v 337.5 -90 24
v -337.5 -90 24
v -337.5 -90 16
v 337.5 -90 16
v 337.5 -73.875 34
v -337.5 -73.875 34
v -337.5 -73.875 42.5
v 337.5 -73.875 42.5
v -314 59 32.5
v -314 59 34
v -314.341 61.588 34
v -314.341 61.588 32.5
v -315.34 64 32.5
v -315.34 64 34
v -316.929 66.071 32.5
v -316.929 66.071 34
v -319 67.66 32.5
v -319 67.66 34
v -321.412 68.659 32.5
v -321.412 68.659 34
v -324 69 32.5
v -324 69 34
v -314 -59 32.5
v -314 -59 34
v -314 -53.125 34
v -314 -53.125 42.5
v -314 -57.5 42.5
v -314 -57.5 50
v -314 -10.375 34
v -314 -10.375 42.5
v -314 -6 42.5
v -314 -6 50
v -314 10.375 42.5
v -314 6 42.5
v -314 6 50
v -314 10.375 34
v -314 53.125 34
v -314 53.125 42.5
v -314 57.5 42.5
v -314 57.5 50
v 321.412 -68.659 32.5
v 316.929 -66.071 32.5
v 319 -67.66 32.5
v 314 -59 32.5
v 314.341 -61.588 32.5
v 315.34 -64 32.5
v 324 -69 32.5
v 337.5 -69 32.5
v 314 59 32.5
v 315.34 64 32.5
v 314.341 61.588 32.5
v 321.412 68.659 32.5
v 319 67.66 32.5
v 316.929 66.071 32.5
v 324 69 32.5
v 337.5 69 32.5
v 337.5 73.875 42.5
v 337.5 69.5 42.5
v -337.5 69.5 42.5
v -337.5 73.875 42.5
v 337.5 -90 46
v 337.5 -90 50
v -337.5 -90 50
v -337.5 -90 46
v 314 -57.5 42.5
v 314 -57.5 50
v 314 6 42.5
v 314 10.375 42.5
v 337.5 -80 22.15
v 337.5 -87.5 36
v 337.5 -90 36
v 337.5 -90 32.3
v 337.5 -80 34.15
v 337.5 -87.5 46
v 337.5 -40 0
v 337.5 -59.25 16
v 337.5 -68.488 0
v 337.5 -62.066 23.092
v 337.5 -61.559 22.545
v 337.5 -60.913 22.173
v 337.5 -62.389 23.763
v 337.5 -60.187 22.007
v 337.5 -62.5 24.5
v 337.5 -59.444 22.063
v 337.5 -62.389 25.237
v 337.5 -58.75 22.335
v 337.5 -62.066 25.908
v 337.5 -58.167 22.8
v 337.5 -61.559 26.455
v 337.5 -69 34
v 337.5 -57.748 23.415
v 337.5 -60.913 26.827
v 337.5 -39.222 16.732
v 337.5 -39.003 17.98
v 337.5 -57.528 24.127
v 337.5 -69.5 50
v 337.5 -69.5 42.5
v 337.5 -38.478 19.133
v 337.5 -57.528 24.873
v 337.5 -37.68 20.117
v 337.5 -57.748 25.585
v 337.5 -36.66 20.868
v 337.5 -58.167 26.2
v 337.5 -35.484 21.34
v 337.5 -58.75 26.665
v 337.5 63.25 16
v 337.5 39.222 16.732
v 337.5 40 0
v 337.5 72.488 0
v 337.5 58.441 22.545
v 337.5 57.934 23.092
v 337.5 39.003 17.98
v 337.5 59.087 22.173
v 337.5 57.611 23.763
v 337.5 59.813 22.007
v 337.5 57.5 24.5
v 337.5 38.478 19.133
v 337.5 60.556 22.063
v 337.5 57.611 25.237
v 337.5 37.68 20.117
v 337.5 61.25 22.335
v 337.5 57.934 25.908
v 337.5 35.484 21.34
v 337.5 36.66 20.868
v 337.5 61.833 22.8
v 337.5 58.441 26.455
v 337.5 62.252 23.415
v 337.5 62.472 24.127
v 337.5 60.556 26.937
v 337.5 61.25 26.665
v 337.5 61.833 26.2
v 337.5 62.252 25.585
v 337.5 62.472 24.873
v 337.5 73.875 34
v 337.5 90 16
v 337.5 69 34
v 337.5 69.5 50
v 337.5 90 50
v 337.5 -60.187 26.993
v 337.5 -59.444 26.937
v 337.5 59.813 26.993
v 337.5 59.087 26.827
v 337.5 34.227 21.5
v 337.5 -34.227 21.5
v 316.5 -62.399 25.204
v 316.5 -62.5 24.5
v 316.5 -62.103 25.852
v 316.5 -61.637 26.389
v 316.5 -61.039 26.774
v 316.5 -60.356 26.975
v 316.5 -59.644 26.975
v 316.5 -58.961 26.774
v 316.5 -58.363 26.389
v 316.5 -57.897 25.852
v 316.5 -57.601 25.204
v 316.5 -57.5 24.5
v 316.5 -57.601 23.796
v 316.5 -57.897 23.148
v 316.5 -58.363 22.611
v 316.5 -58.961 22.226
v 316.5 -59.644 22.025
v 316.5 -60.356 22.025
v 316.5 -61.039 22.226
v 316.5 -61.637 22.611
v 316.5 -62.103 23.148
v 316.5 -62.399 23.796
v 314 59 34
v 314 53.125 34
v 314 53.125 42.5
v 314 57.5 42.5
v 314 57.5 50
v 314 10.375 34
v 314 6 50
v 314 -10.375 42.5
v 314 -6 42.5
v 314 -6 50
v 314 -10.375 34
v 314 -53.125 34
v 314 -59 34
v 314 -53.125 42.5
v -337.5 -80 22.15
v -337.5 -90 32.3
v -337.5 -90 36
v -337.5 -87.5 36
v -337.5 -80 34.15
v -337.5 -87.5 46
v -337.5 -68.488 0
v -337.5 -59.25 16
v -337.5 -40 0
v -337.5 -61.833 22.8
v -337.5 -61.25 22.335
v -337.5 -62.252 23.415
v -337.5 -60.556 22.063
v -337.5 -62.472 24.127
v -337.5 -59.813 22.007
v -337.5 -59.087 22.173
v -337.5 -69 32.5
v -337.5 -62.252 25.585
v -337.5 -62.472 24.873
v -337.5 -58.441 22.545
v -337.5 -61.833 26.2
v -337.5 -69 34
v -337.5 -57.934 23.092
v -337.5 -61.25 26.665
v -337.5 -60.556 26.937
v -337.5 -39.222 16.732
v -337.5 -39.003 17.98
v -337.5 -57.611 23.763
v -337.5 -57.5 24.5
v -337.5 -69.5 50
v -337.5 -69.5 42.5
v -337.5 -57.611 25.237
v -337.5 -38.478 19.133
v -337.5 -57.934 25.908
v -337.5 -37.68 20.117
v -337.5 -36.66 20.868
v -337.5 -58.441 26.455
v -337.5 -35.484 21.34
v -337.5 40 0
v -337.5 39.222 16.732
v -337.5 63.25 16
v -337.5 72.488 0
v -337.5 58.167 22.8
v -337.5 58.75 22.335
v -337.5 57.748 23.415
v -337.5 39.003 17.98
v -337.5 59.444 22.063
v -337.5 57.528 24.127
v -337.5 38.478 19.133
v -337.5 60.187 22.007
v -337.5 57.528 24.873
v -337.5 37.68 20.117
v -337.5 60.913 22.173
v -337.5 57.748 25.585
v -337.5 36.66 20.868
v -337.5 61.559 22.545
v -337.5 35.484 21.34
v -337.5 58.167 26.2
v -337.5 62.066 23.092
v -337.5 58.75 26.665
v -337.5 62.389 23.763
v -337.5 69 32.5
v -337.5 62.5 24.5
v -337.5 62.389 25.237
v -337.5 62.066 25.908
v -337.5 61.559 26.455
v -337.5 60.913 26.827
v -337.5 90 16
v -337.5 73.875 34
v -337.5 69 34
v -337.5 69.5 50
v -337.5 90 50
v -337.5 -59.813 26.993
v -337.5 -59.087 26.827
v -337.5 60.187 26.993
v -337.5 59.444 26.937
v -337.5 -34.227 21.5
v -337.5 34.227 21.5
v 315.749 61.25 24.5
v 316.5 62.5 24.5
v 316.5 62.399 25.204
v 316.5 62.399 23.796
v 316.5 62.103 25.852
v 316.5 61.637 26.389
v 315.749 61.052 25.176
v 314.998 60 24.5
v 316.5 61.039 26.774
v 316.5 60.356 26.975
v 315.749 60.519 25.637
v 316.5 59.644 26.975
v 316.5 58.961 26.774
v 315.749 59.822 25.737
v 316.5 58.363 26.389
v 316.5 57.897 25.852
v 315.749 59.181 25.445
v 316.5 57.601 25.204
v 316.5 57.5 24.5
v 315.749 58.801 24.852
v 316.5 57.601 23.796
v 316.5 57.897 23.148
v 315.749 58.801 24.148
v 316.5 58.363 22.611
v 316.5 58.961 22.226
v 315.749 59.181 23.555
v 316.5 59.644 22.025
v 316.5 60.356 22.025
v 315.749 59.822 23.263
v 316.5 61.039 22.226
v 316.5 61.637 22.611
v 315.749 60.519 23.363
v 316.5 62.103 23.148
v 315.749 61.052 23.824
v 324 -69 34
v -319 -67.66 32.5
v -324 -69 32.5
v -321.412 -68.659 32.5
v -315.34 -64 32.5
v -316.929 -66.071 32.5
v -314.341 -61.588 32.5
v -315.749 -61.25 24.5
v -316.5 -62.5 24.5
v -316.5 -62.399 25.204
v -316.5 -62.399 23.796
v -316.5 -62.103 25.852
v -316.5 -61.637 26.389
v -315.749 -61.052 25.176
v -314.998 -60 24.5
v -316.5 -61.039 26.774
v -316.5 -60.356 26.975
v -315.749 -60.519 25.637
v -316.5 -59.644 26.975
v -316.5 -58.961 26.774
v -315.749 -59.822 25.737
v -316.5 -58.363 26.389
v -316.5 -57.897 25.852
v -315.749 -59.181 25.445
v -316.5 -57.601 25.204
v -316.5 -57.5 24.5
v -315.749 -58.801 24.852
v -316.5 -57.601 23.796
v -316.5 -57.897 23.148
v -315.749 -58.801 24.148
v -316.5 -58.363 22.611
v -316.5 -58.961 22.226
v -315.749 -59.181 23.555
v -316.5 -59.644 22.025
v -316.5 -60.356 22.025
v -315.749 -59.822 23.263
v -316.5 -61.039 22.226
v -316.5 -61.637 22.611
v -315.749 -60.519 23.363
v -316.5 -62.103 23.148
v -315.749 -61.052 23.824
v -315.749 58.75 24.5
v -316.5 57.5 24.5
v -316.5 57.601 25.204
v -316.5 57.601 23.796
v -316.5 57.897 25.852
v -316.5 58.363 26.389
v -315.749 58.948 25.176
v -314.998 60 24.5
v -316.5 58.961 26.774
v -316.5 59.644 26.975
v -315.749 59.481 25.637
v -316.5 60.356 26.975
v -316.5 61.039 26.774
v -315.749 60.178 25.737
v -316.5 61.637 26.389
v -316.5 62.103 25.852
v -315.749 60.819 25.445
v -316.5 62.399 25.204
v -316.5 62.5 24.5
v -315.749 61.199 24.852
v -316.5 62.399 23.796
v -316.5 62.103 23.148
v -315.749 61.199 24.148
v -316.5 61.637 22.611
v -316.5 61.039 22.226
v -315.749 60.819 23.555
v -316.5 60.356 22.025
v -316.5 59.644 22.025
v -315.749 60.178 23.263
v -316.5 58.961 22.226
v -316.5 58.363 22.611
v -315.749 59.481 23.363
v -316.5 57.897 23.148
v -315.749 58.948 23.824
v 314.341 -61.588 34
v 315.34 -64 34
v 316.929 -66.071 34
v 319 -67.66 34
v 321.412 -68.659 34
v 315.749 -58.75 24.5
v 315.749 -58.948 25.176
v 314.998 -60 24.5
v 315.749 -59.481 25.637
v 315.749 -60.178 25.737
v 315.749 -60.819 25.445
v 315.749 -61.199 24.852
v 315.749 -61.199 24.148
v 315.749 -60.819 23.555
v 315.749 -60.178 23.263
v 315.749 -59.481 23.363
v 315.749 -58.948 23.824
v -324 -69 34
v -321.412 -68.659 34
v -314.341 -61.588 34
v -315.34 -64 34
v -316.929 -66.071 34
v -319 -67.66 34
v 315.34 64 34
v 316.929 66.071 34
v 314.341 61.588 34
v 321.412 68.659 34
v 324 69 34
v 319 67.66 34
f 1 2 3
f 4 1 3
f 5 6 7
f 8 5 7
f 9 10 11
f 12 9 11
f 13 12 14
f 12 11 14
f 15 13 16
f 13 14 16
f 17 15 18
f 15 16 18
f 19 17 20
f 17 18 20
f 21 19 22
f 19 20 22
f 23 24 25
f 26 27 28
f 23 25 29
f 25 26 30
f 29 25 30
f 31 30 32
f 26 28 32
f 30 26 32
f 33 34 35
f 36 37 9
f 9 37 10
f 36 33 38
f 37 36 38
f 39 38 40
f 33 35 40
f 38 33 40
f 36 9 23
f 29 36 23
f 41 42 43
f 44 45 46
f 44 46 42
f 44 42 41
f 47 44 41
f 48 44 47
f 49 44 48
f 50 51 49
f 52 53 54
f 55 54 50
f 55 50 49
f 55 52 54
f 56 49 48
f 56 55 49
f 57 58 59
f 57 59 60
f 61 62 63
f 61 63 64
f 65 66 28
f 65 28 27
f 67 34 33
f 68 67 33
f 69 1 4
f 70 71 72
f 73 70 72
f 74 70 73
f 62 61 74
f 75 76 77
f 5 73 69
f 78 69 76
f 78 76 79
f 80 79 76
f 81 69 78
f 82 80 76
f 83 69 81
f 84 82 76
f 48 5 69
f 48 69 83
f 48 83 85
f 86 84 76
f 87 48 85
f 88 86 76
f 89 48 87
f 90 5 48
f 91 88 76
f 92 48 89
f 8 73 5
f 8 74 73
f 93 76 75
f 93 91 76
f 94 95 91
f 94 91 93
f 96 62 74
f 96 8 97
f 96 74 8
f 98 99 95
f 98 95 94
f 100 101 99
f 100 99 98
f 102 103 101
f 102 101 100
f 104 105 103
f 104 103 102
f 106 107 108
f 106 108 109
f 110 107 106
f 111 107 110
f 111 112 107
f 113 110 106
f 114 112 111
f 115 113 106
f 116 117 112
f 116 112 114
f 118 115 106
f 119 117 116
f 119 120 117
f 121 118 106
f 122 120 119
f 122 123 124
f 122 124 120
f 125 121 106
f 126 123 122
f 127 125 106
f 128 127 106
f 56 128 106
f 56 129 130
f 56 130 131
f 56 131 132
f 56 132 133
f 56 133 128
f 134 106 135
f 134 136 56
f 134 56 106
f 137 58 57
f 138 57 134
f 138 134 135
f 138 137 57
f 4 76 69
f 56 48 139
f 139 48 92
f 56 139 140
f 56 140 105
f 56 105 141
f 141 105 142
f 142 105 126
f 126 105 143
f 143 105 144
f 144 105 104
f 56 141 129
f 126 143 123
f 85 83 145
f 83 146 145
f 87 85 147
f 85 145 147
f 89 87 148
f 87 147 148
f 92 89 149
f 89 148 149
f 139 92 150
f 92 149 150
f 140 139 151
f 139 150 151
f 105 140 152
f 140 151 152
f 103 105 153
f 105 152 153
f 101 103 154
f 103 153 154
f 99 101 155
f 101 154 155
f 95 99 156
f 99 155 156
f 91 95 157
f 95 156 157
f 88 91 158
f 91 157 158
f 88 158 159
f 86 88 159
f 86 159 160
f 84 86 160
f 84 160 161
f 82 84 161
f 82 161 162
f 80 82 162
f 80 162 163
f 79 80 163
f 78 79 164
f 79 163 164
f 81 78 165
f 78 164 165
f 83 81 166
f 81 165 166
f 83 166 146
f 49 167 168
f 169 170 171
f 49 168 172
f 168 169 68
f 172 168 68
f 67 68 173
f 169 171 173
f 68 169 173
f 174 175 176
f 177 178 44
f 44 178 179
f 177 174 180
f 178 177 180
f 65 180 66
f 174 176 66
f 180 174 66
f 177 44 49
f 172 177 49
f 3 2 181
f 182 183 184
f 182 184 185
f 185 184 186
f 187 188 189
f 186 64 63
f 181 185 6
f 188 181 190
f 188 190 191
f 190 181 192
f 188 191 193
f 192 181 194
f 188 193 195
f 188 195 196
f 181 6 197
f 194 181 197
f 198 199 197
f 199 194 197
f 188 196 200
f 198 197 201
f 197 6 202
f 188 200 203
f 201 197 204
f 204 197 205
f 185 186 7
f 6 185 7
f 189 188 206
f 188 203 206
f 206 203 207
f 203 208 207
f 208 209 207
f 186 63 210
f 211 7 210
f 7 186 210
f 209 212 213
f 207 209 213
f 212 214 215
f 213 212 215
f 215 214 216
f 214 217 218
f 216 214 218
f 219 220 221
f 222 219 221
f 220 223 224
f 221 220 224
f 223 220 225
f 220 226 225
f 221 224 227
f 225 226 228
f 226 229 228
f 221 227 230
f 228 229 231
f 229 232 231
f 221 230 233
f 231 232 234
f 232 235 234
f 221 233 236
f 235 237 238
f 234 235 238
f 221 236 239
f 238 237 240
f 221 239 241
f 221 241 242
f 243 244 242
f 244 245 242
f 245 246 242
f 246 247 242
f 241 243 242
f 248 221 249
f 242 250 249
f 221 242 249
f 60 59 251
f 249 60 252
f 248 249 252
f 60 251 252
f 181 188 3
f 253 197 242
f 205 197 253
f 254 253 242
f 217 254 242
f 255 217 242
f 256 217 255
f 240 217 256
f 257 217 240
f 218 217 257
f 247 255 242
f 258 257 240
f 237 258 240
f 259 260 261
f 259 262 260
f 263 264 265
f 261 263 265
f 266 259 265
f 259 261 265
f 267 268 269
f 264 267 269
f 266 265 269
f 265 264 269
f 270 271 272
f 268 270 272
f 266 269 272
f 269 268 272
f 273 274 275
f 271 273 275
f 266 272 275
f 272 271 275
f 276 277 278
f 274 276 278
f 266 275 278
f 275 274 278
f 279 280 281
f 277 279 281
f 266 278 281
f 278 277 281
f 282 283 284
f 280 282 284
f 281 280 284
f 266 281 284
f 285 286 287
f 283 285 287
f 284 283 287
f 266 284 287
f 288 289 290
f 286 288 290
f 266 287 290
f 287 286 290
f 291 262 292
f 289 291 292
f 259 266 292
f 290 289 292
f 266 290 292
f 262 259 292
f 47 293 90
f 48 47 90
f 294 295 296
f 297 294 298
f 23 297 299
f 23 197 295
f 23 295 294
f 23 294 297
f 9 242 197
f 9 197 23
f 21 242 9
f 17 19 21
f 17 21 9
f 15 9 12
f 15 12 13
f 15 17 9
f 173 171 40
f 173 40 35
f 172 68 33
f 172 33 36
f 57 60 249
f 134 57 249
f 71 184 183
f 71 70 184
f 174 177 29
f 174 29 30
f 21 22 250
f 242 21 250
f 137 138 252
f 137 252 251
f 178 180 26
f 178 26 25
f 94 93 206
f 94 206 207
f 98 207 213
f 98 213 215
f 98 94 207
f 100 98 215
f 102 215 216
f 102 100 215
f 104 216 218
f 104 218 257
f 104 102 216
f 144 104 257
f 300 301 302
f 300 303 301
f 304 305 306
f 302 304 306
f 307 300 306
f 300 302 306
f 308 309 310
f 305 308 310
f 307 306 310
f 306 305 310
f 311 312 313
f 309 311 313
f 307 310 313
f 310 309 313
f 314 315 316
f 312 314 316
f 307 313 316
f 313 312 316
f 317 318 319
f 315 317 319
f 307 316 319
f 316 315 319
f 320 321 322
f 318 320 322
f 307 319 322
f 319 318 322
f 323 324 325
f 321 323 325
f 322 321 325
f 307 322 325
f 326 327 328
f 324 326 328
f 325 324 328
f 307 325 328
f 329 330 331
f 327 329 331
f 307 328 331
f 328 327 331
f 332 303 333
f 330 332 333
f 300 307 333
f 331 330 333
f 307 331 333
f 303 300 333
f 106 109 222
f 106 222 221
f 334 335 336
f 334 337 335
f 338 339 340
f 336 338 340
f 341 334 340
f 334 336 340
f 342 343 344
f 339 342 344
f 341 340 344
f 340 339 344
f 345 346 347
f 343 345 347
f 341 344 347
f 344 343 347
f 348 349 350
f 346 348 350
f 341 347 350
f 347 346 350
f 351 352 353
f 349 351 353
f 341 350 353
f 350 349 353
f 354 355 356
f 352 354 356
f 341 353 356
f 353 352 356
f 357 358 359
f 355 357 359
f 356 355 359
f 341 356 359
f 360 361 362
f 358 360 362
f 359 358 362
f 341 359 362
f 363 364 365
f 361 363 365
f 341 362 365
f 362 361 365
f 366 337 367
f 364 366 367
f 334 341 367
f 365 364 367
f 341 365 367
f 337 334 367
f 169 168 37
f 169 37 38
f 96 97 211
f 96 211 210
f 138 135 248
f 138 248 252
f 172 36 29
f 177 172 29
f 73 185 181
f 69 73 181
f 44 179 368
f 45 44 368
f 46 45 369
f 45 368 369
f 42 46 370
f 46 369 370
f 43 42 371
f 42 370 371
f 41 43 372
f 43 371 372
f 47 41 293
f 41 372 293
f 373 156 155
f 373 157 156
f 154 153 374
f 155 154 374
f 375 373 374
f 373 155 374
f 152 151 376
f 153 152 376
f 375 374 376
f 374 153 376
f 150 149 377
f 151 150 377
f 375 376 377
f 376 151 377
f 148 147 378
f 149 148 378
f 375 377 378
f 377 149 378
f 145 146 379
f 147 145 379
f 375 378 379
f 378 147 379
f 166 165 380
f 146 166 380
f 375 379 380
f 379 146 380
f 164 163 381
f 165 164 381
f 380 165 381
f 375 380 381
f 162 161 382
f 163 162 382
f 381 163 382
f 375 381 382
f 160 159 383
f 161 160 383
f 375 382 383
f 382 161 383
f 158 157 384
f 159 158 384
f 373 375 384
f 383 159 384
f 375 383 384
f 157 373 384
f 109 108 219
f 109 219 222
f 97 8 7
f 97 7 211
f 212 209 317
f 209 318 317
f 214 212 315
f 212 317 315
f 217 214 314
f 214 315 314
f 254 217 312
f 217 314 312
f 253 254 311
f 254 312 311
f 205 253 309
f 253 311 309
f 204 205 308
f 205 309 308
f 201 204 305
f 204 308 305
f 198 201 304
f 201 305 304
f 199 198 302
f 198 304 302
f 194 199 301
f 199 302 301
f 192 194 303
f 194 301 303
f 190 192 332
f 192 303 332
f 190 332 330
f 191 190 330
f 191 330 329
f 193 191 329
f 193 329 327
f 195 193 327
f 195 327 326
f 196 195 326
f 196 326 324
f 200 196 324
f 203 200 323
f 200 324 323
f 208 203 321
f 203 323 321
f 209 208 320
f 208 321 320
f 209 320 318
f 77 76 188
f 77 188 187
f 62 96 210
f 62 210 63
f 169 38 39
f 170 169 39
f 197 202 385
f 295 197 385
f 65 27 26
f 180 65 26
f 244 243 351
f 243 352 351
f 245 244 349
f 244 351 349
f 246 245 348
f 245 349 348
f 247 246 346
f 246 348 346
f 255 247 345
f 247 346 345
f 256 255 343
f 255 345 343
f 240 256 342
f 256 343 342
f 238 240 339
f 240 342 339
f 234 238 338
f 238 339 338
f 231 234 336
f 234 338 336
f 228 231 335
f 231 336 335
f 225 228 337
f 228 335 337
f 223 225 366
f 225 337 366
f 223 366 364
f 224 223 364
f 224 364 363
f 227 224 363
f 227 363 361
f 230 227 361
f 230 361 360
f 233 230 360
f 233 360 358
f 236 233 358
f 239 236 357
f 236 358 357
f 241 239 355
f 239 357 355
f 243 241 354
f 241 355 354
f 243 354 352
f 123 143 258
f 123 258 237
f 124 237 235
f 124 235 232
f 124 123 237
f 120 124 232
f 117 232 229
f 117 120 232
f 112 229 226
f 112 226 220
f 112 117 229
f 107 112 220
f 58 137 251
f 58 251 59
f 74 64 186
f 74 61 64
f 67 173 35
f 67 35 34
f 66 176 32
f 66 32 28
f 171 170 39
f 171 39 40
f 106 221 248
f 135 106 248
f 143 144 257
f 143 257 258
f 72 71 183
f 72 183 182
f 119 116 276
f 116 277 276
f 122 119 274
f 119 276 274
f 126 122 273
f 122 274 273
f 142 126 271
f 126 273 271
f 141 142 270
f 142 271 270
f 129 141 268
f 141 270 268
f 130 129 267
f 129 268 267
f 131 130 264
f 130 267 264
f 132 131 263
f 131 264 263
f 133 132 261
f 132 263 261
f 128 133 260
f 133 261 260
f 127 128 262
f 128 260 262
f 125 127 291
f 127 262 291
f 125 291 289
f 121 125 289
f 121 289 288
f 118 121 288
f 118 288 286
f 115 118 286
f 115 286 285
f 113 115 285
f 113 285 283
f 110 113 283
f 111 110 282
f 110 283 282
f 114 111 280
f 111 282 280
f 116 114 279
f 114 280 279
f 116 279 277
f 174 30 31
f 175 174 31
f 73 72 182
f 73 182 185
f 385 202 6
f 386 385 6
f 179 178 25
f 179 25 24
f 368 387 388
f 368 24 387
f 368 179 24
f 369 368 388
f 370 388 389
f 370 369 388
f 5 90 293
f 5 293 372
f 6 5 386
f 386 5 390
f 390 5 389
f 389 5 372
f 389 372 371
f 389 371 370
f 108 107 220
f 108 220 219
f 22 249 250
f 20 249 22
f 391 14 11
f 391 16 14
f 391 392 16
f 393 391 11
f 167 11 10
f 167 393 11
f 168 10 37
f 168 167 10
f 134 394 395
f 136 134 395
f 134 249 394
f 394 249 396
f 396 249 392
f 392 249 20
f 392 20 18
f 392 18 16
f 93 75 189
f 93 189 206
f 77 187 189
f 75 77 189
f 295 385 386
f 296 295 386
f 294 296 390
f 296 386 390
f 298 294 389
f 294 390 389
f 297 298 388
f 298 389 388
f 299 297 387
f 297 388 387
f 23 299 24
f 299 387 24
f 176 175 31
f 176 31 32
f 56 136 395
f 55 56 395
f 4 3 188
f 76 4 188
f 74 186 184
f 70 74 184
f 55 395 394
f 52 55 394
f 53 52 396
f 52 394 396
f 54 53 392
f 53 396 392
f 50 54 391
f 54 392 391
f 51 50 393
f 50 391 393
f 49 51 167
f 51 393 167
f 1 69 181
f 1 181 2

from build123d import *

# Parameters (mm, degrees)
F1_DEPTH      = 337.5
F3_DEPTH      = 1.5
F3_DEPTH_BACK = 16
F5_D          = 5
F5_DEPTH      = 21
F5_TIP        = 1.5021515476
F7_D          = 5
F7_DEPTH      = 21
F7_TIP        = 1.5021515476


with BuildPart() as f1:
    # F0 (on Right) → F1 (new body, symmetric)
    with BuildSketch(Plane.YZ):
        with BuildLine():
            Line((-87.5, 36), (-90, 36))
            Line((-90, 36), (-90, 32.3))
            Line((-90, 32.3), (-80, 34.15))
            Line((-80, 34.15), (-80, 22.15))
            Line((-80, 22.15), (-90, 24))
            Line((-90, 24), (-90, 16))
            Line((-90, 16), (-59.25, 16))
            Line((-59.25, 16), (-68.487604307, 0))
            Line((-68.487604307, 0), (-40, 0))
            Line((-40, 0), (-39.2217531629, 16.7323069968))
            ThreePointArc((-39.2217531629, 16.7323069968), (-37.6795768821, 20.1167343684), (-34.2271527326, 21.5))
            Line((-34.2271527326, 21.5), (34.2271527326, 21.5))
            ThreePointArc((34.2271527326, 21.5), (37.6795768821, 20.1167343684), (39.2217531629, 16.7323069968))
            Line((39.2217531629, 16.7323069968), (40, 0))
            Line((40, 0), (72.487604307, 0))
            Line((72.487604307, 0), (63.25, 16))
            Line((63.25, 16), (90, 16))
            Line((90, 16), (90, 50))
            Line((90, 50), (69.5, 50))
            Line((69.5, 50), (69.5, 42.5))
            Line((69.5, 42.5), (73.875, 42.5))
            Line((73.875, 42.5), (73.875, 34))
            Line((73.875, 34), (53.125, 34))
            Line((53.125, 34), (53.125, 42.5))
            Line((53.125, 42.5), (57.5, 42.5))
            Line((57.5, 42.5), (57.5, 50))
            Line((57.5, 50), (6, 50))
            Line((6, 50), (6, 42.5))
            Line((6, 42.5), (10.375, 42.5))
            Line((10.375, 42.5), (10.375, 34))
            Line((10.375, 34), (-10.375, 34))
            Line((-10.375, 34), (-10.375, 42.5))
            Line((-10.375, 42.5), (-6, 42.5))
            Line((-6, 42.5), (-6, 50))
            Line((-6, 50), (-57.5, 50))
            Line((-57.5, 50), (-57.5, 42.5))
            Line((-57.5, 42.5), (-53.125, 42.5))
            Line((-53.125, 42.5), (-53.125, 34))
            Line((-53.125, 34), (-73.875, 34))
            Line((-73.875, 34), (-73.875, 42.5))
            Line((-73.875, 42.5), (-69.5, 42.5))
            Line((-69.5, 42.5), (-69.5, 50))
            Line((-69.5, 50), (-90, 50))
            Line((-90, 50), (-90, 46))
            Line((-90, 46), (-87.5, 46))
            Line((-87.5, 46), (-87.5, 36))
        make_face()
    extrude(amount=F1_DEPTH, both=True)

    # F2 (on face) → F3 (cut, two sides)
    with BuildSketch(Plane.XY.offset(34)) as f3_sk:
        with BuildLine():
            ThreePointArc((314, -59), (316.9289321881, -66.0710678119), (324, -69))
            Line((324, -69), (337.5, -69))
            Line((337.5, -69), (337.5, 69))
            Line((337.5, 69), (324, 69))
            ThreePointArc((324, 69), (316.9289321881, 66.0710678119), (314, 59))
            Line((314, 59), (314, -59))
        make_face()
        with BuildLine():
            ThreePointArc((-324, -69), (-316.9289321881, -66.0710678119), (-314, -59))
            Line((-314, -59), (-314, 59))
            ThreePointArc((-314, 59), (-316.9289321881, 66.0710678119), (-324, 69))
            Line((-324, 69), (-337.5, 69))
            Line((-337.5, 69), (-337.5, -69))
            Line((-337.5, -69), (-324, -69))
        make_face()
    extrude(amount=-F3_DEPTH, mode=Mode.SUBTRACT)
    extrude(f3_sk.sketch, amount=F3_DEPTH_BACK, mode=Mode.SUBTRACT)

    # F5
    with Locations(Plane.YZ.offset(337.5)):
        with Locations((-60, 24.5), (60, 24.5)):
            Hole(F5_D / 2, depth=F5_DEPTH)
            with Locations((0, 0, -(F5_DEPTH + F5_TIP / 2))):  # 118° drill point
                Cone(0, F5_D / 2, F5_TIP, mode=Mode.SUBTRACT)

    # F7
    with Locations(Plane(origin=(-337.5, 0, 0), x_dir=(0, -1, 0), z_dir=(-1, 0, 0))):
        with Locations((-60, 24.5), (60, 24.5)):
            Hole(F7_D / 2, depth=F7_DEPTH)
            with Locations((0, 0, -(F7_DEPTH + F7_TIP / 2))):  # 118° drill point
                Cone(0, F7_D / 2, F7_TIP, mode=Mode.SUBTRACT)


solid = f1.part
